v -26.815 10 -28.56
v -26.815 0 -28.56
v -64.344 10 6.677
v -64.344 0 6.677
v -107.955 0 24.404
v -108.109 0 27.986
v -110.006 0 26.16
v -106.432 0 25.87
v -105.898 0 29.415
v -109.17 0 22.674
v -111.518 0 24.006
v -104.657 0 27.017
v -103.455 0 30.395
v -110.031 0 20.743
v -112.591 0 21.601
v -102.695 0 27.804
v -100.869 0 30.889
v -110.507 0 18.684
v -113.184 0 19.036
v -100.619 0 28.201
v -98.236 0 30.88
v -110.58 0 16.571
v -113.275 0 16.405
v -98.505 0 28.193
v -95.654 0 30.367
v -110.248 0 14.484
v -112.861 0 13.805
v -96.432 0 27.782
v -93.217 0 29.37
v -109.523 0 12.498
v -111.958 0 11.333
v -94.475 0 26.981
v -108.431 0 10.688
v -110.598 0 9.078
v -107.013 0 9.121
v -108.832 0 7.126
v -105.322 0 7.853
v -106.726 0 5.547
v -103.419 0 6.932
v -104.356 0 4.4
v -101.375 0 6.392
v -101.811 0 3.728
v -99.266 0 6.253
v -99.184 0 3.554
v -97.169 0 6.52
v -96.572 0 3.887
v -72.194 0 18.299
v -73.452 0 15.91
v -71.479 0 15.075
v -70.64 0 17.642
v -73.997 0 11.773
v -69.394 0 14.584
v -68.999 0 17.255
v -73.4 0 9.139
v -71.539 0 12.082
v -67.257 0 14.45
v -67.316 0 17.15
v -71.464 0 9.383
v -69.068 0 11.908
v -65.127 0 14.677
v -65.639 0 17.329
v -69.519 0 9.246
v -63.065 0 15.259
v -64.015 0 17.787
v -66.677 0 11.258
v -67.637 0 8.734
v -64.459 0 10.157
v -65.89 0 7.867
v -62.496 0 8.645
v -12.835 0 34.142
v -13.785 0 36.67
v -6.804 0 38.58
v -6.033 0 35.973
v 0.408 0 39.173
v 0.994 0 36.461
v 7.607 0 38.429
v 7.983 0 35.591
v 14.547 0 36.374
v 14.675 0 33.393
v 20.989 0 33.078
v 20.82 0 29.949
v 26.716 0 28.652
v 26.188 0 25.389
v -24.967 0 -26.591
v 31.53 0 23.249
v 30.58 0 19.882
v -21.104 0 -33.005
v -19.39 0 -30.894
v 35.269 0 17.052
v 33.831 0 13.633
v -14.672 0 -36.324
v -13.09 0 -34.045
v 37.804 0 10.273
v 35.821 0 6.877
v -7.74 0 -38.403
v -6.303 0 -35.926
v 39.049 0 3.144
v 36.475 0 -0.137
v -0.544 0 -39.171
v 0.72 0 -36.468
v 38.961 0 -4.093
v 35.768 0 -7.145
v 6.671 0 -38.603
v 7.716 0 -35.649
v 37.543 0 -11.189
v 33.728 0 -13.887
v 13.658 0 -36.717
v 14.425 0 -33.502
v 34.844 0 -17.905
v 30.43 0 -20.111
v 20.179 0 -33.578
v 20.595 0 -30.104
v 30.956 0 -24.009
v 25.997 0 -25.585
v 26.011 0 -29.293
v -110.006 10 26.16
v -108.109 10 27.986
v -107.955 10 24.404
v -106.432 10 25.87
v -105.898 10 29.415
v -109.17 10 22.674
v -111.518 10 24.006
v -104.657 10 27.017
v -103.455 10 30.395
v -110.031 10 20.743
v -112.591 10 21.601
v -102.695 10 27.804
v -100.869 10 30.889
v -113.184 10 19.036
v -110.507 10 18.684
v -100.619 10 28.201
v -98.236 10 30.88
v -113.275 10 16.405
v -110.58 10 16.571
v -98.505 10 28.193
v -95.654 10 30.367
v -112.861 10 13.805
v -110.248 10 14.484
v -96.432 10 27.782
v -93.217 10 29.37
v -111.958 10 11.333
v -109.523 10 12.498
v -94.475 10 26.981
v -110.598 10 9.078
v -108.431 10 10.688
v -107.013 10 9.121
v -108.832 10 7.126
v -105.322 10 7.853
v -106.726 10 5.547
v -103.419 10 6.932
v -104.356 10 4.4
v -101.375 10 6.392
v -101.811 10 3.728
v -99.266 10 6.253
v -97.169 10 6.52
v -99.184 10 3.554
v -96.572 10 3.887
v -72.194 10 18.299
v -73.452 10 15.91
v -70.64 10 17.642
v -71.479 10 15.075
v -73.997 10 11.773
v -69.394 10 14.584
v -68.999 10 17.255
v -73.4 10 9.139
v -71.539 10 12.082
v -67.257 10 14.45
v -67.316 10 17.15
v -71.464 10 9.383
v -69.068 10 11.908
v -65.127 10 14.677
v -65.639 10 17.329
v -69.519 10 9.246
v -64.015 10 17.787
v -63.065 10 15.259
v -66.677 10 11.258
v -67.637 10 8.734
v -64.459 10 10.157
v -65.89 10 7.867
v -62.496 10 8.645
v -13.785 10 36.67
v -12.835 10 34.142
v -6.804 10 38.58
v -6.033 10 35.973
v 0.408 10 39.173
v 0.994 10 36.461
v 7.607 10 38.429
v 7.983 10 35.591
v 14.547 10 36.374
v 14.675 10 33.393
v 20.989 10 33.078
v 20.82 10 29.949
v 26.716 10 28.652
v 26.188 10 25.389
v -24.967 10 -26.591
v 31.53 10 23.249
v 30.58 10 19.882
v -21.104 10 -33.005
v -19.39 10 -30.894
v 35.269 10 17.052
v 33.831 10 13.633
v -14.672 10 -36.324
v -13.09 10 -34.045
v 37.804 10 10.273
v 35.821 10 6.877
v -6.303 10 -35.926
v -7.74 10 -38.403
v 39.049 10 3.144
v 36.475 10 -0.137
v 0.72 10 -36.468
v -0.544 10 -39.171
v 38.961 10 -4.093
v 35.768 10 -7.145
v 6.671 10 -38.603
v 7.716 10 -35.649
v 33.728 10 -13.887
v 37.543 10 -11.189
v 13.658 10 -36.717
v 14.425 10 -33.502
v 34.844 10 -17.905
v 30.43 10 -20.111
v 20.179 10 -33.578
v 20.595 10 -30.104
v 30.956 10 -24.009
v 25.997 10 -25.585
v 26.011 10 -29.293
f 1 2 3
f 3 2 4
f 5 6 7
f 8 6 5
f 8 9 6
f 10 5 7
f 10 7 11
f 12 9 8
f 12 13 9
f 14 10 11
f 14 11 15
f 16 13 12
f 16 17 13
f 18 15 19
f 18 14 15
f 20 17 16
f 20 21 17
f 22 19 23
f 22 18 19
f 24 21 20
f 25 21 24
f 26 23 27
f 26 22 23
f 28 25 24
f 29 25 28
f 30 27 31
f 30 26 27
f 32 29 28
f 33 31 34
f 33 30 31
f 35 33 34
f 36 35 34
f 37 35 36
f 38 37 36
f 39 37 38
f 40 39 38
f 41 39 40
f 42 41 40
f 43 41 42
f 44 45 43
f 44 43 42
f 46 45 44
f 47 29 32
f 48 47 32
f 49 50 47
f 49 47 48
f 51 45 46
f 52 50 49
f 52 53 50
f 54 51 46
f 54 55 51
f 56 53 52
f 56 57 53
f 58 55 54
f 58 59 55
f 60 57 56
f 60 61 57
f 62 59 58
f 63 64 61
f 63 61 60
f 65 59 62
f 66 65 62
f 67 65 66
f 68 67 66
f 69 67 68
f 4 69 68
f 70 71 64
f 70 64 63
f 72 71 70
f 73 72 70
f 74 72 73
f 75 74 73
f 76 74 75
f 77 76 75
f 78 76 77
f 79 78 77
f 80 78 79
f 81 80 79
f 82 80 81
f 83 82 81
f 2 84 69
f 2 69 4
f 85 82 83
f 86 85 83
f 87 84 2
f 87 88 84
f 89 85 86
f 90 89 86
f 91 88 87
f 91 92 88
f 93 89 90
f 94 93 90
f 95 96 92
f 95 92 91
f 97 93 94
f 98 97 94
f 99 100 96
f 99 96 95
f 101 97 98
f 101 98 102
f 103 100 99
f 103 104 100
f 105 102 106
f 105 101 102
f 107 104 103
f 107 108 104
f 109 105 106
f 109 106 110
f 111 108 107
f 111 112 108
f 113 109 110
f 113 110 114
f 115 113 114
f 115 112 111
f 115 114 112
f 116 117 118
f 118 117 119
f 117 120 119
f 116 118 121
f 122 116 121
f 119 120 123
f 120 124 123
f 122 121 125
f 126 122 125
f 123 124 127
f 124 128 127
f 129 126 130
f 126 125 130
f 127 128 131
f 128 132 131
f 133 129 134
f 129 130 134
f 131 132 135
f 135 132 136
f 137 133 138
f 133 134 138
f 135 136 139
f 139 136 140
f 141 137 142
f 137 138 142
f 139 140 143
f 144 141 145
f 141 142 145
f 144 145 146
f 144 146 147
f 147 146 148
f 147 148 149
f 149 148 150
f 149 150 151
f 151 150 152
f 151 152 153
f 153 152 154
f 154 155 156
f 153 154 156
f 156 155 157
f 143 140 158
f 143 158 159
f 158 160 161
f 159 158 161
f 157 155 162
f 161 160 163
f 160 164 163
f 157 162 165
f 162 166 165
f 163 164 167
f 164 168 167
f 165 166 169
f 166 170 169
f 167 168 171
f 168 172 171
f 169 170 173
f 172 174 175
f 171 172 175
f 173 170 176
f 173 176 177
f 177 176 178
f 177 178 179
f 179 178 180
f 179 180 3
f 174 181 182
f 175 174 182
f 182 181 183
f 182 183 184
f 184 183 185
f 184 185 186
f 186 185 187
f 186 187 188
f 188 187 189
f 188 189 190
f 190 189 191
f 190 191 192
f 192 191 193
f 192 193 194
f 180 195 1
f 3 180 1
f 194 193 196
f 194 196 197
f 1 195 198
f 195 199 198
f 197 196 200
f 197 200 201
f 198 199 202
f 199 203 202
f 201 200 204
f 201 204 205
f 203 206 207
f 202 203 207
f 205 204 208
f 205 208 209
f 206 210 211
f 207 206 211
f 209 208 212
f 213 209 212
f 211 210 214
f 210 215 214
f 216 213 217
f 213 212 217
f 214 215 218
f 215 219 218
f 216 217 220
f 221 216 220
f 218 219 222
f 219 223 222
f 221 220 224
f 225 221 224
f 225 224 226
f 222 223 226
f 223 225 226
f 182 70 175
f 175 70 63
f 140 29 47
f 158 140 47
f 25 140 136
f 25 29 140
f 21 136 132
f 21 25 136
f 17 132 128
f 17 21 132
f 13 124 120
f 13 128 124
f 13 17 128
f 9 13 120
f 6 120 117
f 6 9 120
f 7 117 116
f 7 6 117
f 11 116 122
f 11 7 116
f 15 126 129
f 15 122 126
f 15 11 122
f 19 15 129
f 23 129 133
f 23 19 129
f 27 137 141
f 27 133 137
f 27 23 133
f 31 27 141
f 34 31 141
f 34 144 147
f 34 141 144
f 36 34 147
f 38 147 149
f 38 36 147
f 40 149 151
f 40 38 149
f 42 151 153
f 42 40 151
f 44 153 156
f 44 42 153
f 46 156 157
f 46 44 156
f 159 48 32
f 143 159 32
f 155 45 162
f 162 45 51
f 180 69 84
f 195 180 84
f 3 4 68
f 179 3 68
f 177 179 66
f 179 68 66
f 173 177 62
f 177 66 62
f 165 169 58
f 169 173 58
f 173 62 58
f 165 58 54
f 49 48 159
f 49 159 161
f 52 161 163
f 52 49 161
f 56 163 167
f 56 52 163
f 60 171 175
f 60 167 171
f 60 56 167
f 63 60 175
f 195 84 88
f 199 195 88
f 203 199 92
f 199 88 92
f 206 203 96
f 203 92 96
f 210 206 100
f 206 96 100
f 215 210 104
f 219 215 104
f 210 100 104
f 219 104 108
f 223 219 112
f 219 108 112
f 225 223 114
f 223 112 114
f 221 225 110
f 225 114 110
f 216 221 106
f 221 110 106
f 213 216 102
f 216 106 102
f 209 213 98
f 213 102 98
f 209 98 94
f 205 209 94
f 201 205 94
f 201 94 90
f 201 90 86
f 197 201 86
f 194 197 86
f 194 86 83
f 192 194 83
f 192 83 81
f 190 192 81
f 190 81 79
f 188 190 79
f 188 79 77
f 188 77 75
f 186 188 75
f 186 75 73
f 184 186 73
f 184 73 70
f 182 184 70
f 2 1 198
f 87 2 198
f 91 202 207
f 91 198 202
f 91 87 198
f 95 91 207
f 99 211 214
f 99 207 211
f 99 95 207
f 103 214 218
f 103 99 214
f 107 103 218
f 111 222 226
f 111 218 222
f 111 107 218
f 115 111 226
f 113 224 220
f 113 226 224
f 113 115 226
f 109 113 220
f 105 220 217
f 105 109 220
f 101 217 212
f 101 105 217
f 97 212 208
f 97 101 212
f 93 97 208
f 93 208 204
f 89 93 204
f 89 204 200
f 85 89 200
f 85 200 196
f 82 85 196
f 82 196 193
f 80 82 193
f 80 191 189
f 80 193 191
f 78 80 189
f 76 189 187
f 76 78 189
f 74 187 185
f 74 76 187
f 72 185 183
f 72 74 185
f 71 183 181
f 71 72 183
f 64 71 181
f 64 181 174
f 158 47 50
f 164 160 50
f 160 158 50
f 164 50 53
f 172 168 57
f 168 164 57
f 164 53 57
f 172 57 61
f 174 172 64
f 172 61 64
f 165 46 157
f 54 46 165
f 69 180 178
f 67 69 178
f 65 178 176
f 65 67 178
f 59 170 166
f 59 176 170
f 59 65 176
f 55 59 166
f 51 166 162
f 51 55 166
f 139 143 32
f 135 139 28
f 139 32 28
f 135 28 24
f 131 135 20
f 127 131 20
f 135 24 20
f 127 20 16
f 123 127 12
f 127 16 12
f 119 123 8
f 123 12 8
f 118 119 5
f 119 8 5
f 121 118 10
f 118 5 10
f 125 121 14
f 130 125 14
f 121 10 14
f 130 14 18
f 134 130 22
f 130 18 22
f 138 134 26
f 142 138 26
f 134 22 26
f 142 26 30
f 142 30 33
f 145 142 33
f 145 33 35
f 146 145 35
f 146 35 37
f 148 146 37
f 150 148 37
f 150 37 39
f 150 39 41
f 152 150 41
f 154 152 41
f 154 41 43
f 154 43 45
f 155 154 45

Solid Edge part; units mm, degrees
sketch "Sketch1" plane through (0, 0, 0) normal (0, -1, 0) x (1, 0, 0)
  line L0 (-13.7849, 36.6696) -> (-64.0155, 17.7868)
  arc A0 (-64.0155, 17.7868) -> (-72.1937, 18.2991) centre (-67.5343, 27.1472) cw
  line L1 (-93.2174, 29.3701) -> (-72.1937, 18.2991)
  arc A1 (-96.5723, 3.887) -> (-93.2174, 29.3701) centre (-99.6008, 17.2481) cw
  line L2 (-96.5723, 3.887) -> (-73.3996, 9.1394)
  arc A2 (-73.3996, 9.1394) -> (-64.3442, 6.677) centre (-71.1891, -0.6132) cw
  line L3 (-26.8148, -28.5596) -> (-64.3442, 6.677)
  arc A3 (-13.7849, 36.6696) -> (-26.8148, -28.5596) centre (0, 0) cw
  line L4 (-12.8348, 34.1423) -> (-63.0655, 15.2595)
  arc A4 (-63.0655, 15.2595) -> (-73.4518, 15.9101) centre (-67.5343, 27.1472) cw
  line L5 (-73.4518, 15.9101) -> (-94.4754, 26.981)
  arc A5 (-94.4754, 26.981) -> (-97.1692, 6.5202) centre (-99.6008, 17.2481) ccw
  line L6 (-97.1692, 6.5202) -> (-73.9965, 11.7726)
  arc A6 (-73.9965, 11.7726) -> (-62.4961, 8.6454) centre (-71.1891, -0.6132) cw
  line L7 (-62.4961, 8.6454) -> (-24.9666, -26.5912)
  arc A7 (-24.9666, -26.5912) -> (-12.8348, 34.1423) centre (0, 0) ccw
  dimension "D1" = 2.7
extrude "Protrusion1" add sketch "Sketch1" against normal blind 10
properties part number "1976-1200-C05" material "Poliuretano"
